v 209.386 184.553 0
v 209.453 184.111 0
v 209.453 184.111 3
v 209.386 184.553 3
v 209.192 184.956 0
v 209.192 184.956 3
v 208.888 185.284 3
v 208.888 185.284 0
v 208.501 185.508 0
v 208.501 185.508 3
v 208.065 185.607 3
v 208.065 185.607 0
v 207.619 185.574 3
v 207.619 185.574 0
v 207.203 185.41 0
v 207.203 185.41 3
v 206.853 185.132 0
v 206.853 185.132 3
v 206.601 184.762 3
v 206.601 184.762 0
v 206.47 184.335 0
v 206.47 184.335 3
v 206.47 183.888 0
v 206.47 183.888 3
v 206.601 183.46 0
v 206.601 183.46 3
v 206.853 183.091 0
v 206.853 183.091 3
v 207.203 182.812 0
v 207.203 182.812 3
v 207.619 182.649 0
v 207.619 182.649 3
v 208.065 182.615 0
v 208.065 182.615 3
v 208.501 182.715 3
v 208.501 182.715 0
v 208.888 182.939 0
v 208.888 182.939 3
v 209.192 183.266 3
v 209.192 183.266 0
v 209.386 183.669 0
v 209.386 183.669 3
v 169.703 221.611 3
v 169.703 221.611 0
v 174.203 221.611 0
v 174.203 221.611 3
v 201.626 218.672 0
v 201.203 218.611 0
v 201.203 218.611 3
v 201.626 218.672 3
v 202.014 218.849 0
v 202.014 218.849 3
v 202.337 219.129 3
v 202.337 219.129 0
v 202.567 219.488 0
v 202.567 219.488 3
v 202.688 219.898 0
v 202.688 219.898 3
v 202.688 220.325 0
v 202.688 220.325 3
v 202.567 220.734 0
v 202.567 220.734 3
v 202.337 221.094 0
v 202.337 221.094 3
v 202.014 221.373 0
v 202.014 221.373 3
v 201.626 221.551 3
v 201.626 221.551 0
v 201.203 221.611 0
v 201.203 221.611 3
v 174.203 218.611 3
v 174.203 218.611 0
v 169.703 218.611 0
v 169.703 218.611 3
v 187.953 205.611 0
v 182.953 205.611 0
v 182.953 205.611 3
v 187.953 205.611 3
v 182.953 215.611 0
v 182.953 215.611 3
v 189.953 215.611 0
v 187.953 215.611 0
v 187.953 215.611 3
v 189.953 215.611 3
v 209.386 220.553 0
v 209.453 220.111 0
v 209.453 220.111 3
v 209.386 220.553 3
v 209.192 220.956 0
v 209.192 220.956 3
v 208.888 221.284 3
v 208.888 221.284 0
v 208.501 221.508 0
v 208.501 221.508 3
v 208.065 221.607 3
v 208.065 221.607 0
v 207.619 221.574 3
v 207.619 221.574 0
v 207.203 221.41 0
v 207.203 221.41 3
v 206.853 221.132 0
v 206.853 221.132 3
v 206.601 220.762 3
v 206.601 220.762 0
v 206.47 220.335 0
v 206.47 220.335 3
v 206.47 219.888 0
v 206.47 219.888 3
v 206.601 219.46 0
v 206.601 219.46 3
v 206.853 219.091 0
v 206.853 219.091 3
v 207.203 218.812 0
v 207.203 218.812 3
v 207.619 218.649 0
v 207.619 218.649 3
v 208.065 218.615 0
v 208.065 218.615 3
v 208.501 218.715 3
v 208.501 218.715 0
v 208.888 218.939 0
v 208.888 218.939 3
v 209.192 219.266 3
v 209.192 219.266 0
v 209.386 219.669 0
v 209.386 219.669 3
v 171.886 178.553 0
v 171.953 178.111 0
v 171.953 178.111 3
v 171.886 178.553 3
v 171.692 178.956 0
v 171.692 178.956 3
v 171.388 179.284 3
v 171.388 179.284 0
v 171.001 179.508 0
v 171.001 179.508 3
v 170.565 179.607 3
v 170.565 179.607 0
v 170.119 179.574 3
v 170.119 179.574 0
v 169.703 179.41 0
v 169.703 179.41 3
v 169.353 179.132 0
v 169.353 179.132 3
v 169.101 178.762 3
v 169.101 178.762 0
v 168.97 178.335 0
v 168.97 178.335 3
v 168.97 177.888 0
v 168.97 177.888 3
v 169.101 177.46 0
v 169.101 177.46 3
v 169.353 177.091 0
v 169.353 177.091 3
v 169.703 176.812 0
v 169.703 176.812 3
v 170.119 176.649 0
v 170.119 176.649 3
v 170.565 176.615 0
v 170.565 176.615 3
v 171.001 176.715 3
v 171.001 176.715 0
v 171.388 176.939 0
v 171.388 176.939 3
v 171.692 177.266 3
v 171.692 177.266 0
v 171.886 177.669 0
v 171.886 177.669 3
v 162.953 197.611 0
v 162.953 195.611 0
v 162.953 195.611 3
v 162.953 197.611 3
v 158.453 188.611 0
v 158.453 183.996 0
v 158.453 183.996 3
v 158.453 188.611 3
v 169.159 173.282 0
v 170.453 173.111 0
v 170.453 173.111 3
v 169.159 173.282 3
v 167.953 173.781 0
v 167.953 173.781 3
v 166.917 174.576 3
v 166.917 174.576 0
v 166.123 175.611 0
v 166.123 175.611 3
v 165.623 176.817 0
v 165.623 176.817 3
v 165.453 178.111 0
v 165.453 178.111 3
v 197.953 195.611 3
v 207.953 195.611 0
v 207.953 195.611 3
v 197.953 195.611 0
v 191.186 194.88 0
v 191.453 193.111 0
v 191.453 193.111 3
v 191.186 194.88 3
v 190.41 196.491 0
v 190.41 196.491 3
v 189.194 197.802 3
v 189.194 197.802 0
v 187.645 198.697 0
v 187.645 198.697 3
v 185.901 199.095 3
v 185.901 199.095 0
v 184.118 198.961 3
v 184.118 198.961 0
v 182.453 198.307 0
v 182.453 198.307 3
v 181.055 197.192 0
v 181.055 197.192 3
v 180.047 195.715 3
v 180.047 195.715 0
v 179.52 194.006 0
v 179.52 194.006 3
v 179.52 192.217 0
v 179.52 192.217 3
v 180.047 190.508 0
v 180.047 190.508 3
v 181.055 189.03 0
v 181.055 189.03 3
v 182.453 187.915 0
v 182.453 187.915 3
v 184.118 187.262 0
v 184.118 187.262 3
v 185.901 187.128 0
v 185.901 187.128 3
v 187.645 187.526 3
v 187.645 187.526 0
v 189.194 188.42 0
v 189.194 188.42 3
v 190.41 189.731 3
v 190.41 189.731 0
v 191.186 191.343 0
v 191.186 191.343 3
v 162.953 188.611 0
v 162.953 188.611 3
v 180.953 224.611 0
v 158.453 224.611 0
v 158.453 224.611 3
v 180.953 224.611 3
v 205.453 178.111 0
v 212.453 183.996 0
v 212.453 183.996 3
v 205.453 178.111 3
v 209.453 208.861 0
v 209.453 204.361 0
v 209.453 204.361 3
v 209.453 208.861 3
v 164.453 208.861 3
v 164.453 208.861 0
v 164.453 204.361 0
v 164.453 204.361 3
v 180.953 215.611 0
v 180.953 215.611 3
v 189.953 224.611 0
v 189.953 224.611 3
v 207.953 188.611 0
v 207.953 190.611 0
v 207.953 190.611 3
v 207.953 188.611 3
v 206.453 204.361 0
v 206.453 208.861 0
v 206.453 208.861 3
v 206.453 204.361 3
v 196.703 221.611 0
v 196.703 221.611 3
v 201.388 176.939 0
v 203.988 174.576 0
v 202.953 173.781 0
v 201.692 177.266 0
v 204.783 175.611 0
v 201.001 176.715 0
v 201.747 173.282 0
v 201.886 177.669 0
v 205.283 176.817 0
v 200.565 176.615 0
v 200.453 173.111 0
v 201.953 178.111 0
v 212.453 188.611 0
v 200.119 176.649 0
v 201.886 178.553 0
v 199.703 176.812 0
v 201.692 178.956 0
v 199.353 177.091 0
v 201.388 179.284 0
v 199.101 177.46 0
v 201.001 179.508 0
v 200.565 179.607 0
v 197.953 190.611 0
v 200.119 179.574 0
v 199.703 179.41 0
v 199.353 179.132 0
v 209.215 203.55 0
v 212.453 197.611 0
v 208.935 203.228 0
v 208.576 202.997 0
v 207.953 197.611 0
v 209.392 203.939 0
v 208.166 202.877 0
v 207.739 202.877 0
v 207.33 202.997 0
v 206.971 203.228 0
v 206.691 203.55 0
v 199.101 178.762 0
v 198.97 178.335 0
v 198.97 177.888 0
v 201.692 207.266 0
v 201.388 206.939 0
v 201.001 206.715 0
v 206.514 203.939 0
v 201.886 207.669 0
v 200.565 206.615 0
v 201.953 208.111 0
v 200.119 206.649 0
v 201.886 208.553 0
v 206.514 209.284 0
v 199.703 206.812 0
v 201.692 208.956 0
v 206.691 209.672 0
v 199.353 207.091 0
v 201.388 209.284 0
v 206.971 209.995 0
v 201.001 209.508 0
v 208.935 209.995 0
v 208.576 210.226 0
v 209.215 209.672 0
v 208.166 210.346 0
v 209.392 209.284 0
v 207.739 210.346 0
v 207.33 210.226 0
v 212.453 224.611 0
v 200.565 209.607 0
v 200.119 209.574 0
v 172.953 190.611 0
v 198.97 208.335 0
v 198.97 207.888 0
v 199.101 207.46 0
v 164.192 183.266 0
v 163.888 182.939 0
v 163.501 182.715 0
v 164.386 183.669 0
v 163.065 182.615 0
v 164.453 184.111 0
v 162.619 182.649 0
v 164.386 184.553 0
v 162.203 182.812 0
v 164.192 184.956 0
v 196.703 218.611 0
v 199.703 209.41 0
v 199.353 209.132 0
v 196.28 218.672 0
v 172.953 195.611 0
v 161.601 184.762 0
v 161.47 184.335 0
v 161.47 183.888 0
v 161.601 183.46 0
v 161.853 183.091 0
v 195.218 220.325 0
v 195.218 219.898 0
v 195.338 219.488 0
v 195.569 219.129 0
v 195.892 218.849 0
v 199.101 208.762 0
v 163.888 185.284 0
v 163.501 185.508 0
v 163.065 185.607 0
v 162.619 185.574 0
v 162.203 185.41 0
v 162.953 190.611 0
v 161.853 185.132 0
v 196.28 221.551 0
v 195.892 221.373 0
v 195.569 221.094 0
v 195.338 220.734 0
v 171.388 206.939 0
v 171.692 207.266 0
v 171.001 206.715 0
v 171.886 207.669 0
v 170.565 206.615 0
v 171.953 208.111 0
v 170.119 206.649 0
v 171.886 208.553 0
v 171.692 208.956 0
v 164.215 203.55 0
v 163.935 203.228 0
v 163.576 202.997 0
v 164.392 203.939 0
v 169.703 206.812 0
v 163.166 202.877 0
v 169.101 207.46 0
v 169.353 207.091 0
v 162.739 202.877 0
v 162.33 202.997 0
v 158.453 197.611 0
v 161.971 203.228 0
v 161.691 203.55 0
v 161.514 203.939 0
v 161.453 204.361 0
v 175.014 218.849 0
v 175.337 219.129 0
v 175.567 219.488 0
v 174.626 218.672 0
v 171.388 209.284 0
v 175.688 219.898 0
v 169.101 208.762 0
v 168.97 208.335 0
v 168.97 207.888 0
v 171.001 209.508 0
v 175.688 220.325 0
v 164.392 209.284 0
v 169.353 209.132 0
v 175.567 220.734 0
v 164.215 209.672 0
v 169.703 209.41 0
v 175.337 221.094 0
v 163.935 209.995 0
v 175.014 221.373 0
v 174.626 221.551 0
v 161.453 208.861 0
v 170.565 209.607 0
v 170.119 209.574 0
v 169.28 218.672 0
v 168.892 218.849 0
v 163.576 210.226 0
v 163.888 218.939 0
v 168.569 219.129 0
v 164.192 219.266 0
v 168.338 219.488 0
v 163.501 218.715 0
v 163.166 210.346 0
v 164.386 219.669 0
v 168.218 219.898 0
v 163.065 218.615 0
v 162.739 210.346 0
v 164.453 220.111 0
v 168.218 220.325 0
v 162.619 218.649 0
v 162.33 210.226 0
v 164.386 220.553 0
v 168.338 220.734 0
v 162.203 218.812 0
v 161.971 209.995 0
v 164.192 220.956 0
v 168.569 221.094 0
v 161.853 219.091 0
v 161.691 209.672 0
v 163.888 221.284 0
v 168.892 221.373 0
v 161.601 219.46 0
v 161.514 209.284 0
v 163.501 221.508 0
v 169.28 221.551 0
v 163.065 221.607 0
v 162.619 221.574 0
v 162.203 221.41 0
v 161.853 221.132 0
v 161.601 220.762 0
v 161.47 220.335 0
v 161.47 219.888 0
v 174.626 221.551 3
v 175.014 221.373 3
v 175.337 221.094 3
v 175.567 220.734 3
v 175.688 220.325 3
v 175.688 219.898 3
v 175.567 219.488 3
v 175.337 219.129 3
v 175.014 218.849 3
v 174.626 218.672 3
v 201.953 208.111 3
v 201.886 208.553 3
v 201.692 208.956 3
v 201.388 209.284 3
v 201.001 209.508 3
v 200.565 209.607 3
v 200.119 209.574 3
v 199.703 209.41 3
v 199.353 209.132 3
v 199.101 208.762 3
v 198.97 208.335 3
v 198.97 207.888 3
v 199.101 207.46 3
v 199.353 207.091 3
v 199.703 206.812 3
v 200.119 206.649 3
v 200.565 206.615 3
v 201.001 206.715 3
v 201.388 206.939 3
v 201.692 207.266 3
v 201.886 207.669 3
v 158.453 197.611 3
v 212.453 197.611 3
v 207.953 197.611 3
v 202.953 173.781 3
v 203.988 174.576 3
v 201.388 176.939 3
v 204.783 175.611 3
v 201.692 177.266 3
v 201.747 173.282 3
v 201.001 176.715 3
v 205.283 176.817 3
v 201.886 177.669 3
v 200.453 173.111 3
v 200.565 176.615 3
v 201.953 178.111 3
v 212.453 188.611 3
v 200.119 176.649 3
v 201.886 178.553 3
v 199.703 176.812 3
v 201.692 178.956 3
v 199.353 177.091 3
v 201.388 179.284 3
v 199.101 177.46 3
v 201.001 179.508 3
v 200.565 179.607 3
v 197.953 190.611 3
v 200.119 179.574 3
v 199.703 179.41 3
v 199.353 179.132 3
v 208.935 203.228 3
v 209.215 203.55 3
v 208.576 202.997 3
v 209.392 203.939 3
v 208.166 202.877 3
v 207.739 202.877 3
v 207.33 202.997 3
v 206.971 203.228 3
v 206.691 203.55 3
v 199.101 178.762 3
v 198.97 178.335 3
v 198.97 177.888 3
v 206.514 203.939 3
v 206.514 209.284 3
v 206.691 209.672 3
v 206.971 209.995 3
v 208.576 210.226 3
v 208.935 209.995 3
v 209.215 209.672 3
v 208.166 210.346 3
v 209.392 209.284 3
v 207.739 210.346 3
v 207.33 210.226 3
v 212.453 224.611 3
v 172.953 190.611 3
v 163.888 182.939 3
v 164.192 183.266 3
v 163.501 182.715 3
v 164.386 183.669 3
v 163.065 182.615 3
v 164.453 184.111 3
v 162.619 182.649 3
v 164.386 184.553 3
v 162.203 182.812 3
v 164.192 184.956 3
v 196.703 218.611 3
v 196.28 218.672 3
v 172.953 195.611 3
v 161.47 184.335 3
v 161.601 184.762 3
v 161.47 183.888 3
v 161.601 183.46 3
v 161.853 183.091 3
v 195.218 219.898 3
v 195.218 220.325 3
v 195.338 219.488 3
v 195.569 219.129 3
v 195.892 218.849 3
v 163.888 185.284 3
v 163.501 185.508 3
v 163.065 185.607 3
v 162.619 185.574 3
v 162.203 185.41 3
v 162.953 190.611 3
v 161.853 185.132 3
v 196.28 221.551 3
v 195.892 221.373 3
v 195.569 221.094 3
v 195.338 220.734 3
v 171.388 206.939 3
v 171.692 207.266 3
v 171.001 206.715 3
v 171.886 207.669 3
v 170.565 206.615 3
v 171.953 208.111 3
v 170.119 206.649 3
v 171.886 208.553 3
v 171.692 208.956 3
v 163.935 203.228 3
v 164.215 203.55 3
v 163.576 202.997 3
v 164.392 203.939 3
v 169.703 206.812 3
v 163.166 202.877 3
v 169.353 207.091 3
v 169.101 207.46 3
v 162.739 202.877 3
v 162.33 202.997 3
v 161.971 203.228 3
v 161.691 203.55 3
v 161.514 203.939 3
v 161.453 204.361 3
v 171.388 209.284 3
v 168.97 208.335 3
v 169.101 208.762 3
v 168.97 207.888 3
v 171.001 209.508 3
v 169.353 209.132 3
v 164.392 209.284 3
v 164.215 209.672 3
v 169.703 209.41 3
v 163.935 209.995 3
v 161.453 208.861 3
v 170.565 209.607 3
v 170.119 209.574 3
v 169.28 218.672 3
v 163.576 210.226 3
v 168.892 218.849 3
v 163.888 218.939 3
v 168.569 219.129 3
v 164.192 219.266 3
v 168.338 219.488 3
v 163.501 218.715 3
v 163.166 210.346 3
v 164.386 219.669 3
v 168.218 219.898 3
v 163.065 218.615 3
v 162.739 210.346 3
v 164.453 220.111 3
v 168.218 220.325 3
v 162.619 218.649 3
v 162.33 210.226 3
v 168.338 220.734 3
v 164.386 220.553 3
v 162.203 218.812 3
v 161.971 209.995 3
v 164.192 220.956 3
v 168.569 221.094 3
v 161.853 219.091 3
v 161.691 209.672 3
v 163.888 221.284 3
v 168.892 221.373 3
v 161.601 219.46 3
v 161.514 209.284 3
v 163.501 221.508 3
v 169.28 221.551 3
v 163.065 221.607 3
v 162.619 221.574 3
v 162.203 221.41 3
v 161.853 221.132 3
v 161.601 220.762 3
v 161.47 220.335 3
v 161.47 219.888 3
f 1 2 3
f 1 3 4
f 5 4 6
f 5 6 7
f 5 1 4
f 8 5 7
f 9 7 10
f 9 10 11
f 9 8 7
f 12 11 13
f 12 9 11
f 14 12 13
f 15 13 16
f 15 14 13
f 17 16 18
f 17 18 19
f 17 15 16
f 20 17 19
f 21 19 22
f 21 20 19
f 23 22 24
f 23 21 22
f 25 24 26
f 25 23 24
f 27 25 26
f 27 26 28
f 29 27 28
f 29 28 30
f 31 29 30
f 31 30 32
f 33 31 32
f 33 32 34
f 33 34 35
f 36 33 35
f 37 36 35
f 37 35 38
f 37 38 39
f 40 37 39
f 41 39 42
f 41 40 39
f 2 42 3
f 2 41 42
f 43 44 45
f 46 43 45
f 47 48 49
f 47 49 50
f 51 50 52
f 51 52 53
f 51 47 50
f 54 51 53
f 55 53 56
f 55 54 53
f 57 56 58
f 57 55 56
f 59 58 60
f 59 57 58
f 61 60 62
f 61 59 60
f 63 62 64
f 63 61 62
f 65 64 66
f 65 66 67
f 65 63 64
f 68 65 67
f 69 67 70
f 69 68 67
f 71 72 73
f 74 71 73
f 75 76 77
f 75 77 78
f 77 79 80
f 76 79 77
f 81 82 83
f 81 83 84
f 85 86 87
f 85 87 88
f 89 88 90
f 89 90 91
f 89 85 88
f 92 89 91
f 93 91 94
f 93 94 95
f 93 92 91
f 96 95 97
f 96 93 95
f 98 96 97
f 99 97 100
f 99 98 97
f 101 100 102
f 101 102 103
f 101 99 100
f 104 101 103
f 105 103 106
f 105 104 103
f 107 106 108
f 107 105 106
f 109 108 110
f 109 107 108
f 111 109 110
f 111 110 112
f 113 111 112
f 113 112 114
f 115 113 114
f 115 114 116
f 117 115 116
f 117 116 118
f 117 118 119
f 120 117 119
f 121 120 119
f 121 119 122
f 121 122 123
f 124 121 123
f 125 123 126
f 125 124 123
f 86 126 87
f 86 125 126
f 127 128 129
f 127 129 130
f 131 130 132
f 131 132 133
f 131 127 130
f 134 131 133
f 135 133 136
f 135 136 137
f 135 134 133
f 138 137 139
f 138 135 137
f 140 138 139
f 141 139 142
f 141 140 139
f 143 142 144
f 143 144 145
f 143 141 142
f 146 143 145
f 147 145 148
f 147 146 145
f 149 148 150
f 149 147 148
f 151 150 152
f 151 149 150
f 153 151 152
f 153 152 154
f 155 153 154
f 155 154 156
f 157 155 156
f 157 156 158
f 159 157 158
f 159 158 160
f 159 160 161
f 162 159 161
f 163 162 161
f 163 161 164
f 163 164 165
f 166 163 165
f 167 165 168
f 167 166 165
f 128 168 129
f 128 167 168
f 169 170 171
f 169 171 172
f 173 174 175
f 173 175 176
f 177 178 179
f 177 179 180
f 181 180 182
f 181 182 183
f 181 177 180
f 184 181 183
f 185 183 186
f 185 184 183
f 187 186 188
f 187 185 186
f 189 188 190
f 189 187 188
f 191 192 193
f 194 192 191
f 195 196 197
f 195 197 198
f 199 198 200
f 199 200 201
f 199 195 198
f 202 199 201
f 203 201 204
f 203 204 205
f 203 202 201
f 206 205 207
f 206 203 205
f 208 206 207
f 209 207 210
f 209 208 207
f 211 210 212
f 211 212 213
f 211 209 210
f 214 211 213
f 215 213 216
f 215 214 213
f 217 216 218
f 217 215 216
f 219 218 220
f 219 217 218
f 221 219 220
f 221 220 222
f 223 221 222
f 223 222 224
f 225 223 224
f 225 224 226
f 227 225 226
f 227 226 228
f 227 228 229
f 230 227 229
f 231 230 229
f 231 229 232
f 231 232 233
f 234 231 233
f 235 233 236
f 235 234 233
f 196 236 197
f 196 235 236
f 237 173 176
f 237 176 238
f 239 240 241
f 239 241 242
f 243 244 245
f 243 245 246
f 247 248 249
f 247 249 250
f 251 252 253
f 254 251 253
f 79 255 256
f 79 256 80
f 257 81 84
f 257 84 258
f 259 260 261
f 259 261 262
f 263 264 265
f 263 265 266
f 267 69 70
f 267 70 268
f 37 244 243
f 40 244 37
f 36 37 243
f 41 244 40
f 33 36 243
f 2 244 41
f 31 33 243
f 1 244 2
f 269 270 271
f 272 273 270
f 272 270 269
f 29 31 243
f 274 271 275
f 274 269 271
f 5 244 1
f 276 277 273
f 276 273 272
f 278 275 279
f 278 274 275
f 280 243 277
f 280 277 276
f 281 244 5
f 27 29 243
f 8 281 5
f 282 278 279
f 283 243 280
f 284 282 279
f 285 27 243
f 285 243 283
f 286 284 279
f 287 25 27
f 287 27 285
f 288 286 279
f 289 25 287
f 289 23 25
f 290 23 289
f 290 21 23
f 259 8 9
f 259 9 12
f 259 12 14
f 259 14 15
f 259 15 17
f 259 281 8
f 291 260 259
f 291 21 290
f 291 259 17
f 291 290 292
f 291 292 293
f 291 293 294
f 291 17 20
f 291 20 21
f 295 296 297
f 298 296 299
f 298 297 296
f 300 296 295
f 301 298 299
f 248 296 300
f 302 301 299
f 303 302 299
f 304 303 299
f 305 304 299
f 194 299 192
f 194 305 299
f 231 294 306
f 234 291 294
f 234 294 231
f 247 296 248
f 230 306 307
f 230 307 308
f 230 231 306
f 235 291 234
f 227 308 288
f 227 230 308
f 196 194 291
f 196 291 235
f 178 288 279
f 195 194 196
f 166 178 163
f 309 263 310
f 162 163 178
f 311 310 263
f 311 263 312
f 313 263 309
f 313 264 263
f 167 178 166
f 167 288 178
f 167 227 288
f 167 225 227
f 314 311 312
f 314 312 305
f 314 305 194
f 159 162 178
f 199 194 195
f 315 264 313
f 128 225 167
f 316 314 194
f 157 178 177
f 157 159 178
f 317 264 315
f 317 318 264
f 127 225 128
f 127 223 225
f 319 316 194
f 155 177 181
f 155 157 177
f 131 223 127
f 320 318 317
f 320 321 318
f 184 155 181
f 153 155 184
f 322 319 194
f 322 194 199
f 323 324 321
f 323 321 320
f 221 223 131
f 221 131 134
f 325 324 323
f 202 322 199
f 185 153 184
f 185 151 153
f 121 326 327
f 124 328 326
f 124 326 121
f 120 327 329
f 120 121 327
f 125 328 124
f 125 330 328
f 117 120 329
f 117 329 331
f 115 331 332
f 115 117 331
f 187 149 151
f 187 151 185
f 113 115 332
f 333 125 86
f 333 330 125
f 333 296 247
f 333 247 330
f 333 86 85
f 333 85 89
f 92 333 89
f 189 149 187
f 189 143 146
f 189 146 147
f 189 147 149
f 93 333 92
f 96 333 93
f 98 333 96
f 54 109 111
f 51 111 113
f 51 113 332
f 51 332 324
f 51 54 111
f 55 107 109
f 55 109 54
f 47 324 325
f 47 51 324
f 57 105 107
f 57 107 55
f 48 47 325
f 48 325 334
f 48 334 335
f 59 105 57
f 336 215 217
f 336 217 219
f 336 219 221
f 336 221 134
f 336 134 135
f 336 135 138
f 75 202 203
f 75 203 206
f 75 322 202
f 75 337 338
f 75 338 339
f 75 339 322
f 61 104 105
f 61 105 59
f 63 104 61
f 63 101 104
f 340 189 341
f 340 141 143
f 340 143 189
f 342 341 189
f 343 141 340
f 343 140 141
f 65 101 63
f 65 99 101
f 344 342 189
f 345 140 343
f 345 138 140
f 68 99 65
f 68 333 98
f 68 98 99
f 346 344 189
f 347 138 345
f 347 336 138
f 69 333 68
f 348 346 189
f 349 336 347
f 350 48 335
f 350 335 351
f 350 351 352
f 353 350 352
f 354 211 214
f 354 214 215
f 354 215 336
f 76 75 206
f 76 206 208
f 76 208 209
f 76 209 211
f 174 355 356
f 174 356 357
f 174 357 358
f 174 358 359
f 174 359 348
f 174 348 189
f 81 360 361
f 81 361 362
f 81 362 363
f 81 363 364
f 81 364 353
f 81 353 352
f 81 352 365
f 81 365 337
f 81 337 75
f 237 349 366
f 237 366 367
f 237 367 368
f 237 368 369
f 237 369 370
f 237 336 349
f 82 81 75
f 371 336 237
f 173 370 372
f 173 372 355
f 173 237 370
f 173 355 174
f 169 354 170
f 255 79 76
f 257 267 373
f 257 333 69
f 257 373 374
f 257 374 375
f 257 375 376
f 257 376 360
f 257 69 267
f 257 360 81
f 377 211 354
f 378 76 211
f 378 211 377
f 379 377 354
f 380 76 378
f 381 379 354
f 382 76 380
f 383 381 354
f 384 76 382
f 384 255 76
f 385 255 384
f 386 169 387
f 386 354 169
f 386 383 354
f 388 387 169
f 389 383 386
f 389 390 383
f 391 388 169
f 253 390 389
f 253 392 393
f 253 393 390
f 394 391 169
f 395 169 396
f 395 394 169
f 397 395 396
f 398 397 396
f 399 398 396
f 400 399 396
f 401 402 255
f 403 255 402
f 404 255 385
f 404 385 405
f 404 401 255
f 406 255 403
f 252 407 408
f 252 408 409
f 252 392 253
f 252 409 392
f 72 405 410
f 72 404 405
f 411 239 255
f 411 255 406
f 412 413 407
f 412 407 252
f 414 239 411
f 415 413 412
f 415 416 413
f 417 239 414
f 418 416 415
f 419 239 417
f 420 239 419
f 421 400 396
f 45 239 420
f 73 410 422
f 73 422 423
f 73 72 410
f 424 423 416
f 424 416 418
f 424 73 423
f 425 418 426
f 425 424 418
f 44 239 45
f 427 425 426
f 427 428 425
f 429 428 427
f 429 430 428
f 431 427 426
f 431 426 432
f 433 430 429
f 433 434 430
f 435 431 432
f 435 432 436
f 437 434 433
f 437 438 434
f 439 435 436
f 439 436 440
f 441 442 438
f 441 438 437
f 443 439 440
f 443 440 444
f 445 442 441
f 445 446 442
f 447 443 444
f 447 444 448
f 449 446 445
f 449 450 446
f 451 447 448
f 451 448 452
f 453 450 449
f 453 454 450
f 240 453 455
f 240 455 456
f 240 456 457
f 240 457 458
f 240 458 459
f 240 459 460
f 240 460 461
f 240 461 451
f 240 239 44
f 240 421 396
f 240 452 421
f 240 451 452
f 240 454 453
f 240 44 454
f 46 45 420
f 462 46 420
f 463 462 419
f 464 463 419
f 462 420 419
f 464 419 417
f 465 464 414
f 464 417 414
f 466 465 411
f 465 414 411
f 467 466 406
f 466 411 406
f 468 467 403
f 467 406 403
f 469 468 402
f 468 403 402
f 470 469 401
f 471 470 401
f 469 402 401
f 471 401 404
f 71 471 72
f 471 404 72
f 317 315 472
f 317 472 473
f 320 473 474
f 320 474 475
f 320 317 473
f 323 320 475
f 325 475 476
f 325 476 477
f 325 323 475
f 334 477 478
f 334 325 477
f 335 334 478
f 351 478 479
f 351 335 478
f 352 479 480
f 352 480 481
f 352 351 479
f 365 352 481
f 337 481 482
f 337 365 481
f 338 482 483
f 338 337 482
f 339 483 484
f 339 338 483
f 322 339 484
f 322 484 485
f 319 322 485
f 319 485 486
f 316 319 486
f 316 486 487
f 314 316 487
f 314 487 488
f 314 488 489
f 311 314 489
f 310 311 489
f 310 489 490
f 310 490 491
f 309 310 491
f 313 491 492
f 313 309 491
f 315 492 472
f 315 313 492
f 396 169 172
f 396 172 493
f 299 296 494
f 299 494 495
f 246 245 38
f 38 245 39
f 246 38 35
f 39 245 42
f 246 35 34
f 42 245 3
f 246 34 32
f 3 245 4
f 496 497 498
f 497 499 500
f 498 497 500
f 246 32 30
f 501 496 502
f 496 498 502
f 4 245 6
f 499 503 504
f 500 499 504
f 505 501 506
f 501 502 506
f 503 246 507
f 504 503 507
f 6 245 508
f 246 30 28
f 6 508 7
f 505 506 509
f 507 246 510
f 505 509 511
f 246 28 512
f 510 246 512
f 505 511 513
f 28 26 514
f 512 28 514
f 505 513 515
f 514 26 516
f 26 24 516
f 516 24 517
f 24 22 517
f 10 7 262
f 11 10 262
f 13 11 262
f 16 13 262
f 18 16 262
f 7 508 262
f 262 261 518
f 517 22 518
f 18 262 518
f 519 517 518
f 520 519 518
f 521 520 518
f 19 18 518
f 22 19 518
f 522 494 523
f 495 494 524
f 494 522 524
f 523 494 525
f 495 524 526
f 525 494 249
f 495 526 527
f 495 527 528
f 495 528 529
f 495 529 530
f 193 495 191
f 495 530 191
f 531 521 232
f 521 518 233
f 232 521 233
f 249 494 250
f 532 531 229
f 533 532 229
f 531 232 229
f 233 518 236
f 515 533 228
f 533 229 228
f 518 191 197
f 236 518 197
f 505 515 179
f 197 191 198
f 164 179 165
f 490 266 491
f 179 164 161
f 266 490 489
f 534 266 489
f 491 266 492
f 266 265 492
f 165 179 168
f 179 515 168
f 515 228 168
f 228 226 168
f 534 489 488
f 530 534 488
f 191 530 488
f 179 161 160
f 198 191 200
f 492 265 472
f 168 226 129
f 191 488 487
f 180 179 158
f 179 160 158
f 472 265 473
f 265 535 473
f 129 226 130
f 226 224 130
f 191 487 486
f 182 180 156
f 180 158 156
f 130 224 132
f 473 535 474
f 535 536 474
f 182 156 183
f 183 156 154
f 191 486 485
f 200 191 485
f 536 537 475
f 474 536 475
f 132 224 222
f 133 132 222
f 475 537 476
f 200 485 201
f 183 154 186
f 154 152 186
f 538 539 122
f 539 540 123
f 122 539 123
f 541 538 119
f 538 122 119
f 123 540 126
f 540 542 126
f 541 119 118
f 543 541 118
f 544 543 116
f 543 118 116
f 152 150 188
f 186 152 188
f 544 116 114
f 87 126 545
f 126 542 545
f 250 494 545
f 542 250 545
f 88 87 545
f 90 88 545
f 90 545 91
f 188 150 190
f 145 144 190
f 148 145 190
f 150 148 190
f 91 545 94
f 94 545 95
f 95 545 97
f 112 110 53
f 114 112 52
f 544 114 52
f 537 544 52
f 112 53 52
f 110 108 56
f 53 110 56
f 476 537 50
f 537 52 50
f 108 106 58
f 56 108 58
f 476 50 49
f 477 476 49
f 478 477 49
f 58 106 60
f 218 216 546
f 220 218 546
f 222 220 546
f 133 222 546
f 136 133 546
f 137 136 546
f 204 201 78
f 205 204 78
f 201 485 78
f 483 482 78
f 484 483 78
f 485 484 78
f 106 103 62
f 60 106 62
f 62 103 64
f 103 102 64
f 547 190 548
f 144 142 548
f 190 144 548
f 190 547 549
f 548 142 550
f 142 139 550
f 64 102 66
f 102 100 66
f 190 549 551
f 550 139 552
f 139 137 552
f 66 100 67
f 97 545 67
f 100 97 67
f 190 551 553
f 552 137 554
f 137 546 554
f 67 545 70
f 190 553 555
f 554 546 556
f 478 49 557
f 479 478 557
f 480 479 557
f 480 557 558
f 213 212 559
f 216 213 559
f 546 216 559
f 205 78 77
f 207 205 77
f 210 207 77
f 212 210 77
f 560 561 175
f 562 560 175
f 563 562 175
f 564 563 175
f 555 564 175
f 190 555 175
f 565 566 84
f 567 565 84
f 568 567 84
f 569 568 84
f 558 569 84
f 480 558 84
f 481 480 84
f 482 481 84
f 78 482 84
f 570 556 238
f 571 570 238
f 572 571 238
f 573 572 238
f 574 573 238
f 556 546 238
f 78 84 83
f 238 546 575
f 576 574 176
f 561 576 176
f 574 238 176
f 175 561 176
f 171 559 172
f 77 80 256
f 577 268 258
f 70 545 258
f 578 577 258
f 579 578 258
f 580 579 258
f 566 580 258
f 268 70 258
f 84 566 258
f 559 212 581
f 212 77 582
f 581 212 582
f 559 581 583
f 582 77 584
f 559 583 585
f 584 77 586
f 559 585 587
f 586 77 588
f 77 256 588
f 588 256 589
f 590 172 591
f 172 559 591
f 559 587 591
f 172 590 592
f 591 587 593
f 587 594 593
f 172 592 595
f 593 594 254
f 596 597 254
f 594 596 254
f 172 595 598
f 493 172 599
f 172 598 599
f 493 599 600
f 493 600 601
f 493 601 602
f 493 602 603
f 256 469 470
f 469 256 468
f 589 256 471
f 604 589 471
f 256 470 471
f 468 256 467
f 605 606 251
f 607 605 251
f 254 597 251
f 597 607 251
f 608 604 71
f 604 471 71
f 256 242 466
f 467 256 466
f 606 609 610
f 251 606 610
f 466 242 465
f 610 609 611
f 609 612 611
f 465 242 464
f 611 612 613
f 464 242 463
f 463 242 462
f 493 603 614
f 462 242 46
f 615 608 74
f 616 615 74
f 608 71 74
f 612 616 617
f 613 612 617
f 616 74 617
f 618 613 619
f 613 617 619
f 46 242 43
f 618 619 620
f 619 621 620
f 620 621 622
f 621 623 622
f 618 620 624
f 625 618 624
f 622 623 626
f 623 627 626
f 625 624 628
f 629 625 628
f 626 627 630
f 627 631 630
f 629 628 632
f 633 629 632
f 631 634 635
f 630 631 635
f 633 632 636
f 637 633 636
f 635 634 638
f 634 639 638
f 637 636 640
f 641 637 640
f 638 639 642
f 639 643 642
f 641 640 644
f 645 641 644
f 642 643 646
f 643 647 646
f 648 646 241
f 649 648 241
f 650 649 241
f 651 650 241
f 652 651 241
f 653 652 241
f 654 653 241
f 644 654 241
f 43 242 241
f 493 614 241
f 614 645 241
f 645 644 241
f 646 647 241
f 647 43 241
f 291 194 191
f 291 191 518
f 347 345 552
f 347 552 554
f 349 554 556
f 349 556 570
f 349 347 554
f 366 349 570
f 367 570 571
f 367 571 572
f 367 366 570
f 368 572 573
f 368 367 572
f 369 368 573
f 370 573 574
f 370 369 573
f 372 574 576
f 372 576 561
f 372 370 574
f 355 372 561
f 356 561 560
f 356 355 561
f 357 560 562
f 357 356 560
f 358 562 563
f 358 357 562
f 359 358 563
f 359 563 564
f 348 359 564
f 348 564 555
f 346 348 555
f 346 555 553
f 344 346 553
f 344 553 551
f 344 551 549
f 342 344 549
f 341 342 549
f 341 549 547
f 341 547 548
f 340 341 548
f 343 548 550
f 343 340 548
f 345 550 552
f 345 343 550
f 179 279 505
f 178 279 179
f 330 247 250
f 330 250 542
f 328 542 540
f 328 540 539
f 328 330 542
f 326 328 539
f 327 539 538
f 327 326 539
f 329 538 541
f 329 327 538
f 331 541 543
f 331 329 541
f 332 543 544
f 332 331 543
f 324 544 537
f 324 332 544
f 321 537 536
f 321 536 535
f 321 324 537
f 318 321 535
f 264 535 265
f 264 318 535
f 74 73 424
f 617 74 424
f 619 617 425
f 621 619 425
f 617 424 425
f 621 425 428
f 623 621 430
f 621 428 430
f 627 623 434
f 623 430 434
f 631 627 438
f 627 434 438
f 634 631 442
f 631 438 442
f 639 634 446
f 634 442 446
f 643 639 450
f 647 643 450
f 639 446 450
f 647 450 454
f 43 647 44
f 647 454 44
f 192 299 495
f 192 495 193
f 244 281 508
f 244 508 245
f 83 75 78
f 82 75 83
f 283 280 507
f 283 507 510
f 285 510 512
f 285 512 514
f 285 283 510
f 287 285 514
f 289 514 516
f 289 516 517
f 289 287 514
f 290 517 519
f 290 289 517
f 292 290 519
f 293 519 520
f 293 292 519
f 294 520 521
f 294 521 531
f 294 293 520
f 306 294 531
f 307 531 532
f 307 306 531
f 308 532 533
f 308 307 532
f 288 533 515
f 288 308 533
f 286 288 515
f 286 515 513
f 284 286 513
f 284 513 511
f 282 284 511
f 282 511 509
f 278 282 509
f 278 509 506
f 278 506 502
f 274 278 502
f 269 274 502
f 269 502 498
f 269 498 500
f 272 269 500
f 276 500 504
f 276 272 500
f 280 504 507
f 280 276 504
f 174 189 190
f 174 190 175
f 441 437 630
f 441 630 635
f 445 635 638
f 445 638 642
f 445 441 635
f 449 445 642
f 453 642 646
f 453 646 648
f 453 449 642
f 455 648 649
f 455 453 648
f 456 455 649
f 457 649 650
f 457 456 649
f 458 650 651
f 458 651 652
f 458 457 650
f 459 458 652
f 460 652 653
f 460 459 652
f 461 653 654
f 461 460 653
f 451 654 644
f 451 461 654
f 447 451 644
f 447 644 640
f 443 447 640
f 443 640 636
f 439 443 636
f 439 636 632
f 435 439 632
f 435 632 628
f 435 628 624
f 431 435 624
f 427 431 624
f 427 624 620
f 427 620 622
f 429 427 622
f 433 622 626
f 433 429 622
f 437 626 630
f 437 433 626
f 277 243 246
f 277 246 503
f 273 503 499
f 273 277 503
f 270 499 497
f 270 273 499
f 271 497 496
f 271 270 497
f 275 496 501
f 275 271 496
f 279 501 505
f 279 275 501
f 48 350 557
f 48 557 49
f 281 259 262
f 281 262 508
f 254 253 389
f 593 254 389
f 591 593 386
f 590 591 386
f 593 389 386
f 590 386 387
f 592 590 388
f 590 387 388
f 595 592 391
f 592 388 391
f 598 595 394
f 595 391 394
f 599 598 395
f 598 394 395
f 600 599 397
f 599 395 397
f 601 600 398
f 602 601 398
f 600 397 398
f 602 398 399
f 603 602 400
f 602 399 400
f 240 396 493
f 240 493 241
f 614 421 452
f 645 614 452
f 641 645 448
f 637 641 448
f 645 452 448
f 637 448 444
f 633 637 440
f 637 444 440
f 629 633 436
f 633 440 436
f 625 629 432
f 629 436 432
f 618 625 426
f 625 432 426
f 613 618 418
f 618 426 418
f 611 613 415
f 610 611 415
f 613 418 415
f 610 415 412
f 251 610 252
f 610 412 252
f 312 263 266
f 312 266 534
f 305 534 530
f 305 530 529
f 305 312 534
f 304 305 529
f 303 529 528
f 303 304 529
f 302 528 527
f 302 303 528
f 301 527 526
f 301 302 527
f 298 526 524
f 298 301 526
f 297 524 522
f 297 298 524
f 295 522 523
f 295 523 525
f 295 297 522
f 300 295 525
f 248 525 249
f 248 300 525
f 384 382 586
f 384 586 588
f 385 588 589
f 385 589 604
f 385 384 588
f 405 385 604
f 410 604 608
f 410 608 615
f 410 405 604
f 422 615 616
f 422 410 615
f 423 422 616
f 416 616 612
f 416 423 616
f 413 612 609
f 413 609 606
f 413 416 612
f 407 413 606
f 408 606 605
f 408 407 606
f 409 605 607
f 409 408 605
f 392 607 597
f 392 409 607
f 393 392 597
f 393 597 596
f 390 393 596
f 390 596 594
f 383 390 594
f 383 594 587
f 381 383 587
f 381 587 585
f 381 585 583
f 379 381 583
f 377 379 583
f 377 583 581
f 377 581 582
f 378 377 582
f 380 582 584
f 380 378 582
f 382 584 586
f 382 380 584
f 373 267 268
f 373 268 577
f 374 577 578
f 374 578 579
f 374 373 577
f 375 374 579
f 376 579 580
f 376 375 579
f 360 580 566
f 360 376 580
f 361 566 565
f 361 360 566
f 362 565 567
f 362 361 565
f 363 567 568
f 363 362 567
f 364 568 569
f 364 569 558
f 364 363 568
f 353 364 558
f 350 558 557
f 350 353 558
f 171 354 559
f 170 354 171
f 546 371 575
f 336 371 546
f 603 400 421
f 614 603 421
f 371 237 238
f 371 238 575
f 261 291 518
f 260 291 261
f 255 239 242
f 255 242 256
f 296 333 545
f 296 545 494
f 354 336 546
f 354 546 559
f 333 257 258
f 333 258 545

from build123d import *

# Parameters (mm, degrees)
MODEL_R                 = 1.5
MODEL_R_2               = 6
SALIENTE_EXTRUIR1_DEPTH = 3


with BuildPart() as part:
    # Model → Saliente-Extruir1 (new body)
    with BuildSketch(Plane.XY):
        with BuildLine():
            Line((187.952926253, 215.611282897), (189.952926253, 215.611282897))
            Line((189.952926253, 215.611282897), (189.952926253, 224.611282897))
            Line((189.952926253, 224.611282897), (212.452926253, 224.611282897))
            Line((212.452926253, 224.611282897), (212.452926253, 197.611282897))
            Line((212.452926253, 197.611282897), (207.952926253, 197.611282897))
            Line((207.952926253, 197.611282897), (207.952926253, 195.611282897))
            Line((207.952926253, 195.611282897), (197.952926253, 195.611282897))
            Line((197.952926253, 195.611282897), (197.952926253, 190.611282897))
            Line((197.952926253, 190.611282897), (207.952926253, 190.611282897))
            Line((207.952926253, 190.611282897), (207.952926253, 188.611282897))
            Line((207.952926253, 188.611282897), (212.452926253, 188.611282897))
            Line((212.452926253, 188.611282897), (212.452926253, 183.995647927))
            Line((212.452926253, 183.995647927), (205.452926253, 178.111282897))
            ThreePointArc((205.452926253, 178.111282897), (203.988460159, 174.575748991), (200.452926253, 173.111282897))
            Line((200.452926253, 173.111282897), (170.452926253, 173.111282897))
            ThreePointArc((170.452926253, 173.111282897), (166.917392347, 174.575748991), (165.452926253, 178.111282897))
            Line((165.452926253, 178.111282897), (158.452926253, 183.995647927))
            Line((158.452926253, 183.995647927), (158.452926253, 188.611282897))
            Line((158.452926253, 188.611282897), (162.952926253, 188.611282897))
            Line((162.952926253, 188.611282897), (162.952926253, 190.611282897))
            Line((162.952926253, 190.611282897), (172.952926253, 190.611282897))
            Line((172.952926253, 190.611282897), (172.952926253, 195.611282897))
            Line((172.952926253, 195.611282897), (162.952926253, 195.611282897))
            Line((162.952926253, 195.611282897), (162.952926253, 197.611282897))
            Line((162.952926253, 197.611282897), (158.452926253, 197.611282897))
            Line((158.452926253, 197.611282897), (158.452926253, 224.611282897))
            Line((158.452926253, 224.611282897), (180.952926253, 224.611282897))
            Line((180.952926253, 224.611282897), (180.952926253, 215.611282897))
            Line((180.952926253, 215.611282897), (182.952926253, 215.611282897))
            Line((182.952926253, 215.611282897), (182.952926253, 205.611282897))
            Line((182.952926253, 205.611282897), (187.952926253, 205.611282897))
            Line((187.952926253, 205.611282897), (187.952926253, 215.611282897))
        make_face()
        with Locations((207.952926253, 220.111282897)):
            Circle(MODEL_R, mode=Mode.SUBTRACT)
        with Locations((200.452926253, 208.111282897)):
            Circle(MODEL_R, mode=Mode.SUBTRACT)
        with Locations((207.952926253, 184.111282897)):
            Circle(MODEL_R, mode=Mode.SUBTRACT)
        with Locations((185.452926253, 193.111282897)):
            Circle(MODEL_R_2, mode=Mode.SUBTRACT)
        with Locations((200.452926253, 178.111282897)):
            Circle(MODEL_R, mode=Mode.SUBTRACT)
        with Locations((162.952926253, 220.111282897)):
            Circle(MODEL_R, mode=Mode.SUBTRACT)
        with Locations((170.452926253, 208.111282897)):
            Circle(MODEL_R, mode=Mode.SUBTRACT)
        with Locations((162.952926253, 184.111282897)):
            Circle(MODEL_R, mode=Mode.SUBTRACT)
        with Locations((170.452926253, 178.111282897)):
            Circle(MODEL_R, mode=Mode.SUBTRACT)
        with BuildLine():
            Line((169.702926253, 221.611282897), (174.202926253, 221.611282897))
            ThreePointArc((174.202926253, 221.611282897), (175.702926253, 220.111282897), (174.202926253, 218.611282897))
            Line((174.202926253, 218.611282897), (169.702926253, 218.611282897))
            ThreePointArc((169.702926253, 218.611282897), (168.202926253, 220.111282897), (169.702926253, 221.611282897))
        make_face(mode=Mode.SUBTRACT)
        with BuildLine():
            Line((164.452926253, 208.861282897), (164.452926253, 204.361282897))
            ThreePointArc((164.452926253, 204.361282897), (162.952926253, 202.861282897), (161.452926253, 204.361282897))
            Line((161.452926253, 204.361282897), (161.452926253, 208.861282897))
            ThreePointArc((161.452926253, 208.861282897), (162.952926253, 210.361282897), (164.452926253, 208.861282897))
        make_face(mode=Mode.SUBTRACT)
        with BuildLine():
            Line((196.702926253, 218.611282897), (201.202926253, 218.611282897))
            ThreePointArc((201.202926253, 218.611282897), (202.702926253, 220.111282897), (201.202926253, 221.611282897))
            Line((201.202926253, 221.611282897), (196.702926253, 221.611282897))
            ThreePointArc((196.702926253, 221.611282897), (195.202926253, 220.111282897), (196.702926253, 218.611282897))
        make_face(mode=Mode.SUBTRACT)
        with BuildLine():
            Line((206.452926253, 208.861282897), (206.452926253, 204.361282897))
            ThreePointArc((206.452926253, 204.361282897), (207.952926253, 202.861282897), (209.452926253, 204.361282897))
            Line((209.452926253, 204.361282897), (209.452926253, 208.861282897))
            ThreePointArc((209.452926253, 208.861282897), (207.952926253, 210.361282897), (206.452926253, 208.861282897))
        make_face(mode=Mode.SUBTRACT)
    extrude(amount=SALIENTE_EXTRUIR1_DEPTH)


solid = part.part
